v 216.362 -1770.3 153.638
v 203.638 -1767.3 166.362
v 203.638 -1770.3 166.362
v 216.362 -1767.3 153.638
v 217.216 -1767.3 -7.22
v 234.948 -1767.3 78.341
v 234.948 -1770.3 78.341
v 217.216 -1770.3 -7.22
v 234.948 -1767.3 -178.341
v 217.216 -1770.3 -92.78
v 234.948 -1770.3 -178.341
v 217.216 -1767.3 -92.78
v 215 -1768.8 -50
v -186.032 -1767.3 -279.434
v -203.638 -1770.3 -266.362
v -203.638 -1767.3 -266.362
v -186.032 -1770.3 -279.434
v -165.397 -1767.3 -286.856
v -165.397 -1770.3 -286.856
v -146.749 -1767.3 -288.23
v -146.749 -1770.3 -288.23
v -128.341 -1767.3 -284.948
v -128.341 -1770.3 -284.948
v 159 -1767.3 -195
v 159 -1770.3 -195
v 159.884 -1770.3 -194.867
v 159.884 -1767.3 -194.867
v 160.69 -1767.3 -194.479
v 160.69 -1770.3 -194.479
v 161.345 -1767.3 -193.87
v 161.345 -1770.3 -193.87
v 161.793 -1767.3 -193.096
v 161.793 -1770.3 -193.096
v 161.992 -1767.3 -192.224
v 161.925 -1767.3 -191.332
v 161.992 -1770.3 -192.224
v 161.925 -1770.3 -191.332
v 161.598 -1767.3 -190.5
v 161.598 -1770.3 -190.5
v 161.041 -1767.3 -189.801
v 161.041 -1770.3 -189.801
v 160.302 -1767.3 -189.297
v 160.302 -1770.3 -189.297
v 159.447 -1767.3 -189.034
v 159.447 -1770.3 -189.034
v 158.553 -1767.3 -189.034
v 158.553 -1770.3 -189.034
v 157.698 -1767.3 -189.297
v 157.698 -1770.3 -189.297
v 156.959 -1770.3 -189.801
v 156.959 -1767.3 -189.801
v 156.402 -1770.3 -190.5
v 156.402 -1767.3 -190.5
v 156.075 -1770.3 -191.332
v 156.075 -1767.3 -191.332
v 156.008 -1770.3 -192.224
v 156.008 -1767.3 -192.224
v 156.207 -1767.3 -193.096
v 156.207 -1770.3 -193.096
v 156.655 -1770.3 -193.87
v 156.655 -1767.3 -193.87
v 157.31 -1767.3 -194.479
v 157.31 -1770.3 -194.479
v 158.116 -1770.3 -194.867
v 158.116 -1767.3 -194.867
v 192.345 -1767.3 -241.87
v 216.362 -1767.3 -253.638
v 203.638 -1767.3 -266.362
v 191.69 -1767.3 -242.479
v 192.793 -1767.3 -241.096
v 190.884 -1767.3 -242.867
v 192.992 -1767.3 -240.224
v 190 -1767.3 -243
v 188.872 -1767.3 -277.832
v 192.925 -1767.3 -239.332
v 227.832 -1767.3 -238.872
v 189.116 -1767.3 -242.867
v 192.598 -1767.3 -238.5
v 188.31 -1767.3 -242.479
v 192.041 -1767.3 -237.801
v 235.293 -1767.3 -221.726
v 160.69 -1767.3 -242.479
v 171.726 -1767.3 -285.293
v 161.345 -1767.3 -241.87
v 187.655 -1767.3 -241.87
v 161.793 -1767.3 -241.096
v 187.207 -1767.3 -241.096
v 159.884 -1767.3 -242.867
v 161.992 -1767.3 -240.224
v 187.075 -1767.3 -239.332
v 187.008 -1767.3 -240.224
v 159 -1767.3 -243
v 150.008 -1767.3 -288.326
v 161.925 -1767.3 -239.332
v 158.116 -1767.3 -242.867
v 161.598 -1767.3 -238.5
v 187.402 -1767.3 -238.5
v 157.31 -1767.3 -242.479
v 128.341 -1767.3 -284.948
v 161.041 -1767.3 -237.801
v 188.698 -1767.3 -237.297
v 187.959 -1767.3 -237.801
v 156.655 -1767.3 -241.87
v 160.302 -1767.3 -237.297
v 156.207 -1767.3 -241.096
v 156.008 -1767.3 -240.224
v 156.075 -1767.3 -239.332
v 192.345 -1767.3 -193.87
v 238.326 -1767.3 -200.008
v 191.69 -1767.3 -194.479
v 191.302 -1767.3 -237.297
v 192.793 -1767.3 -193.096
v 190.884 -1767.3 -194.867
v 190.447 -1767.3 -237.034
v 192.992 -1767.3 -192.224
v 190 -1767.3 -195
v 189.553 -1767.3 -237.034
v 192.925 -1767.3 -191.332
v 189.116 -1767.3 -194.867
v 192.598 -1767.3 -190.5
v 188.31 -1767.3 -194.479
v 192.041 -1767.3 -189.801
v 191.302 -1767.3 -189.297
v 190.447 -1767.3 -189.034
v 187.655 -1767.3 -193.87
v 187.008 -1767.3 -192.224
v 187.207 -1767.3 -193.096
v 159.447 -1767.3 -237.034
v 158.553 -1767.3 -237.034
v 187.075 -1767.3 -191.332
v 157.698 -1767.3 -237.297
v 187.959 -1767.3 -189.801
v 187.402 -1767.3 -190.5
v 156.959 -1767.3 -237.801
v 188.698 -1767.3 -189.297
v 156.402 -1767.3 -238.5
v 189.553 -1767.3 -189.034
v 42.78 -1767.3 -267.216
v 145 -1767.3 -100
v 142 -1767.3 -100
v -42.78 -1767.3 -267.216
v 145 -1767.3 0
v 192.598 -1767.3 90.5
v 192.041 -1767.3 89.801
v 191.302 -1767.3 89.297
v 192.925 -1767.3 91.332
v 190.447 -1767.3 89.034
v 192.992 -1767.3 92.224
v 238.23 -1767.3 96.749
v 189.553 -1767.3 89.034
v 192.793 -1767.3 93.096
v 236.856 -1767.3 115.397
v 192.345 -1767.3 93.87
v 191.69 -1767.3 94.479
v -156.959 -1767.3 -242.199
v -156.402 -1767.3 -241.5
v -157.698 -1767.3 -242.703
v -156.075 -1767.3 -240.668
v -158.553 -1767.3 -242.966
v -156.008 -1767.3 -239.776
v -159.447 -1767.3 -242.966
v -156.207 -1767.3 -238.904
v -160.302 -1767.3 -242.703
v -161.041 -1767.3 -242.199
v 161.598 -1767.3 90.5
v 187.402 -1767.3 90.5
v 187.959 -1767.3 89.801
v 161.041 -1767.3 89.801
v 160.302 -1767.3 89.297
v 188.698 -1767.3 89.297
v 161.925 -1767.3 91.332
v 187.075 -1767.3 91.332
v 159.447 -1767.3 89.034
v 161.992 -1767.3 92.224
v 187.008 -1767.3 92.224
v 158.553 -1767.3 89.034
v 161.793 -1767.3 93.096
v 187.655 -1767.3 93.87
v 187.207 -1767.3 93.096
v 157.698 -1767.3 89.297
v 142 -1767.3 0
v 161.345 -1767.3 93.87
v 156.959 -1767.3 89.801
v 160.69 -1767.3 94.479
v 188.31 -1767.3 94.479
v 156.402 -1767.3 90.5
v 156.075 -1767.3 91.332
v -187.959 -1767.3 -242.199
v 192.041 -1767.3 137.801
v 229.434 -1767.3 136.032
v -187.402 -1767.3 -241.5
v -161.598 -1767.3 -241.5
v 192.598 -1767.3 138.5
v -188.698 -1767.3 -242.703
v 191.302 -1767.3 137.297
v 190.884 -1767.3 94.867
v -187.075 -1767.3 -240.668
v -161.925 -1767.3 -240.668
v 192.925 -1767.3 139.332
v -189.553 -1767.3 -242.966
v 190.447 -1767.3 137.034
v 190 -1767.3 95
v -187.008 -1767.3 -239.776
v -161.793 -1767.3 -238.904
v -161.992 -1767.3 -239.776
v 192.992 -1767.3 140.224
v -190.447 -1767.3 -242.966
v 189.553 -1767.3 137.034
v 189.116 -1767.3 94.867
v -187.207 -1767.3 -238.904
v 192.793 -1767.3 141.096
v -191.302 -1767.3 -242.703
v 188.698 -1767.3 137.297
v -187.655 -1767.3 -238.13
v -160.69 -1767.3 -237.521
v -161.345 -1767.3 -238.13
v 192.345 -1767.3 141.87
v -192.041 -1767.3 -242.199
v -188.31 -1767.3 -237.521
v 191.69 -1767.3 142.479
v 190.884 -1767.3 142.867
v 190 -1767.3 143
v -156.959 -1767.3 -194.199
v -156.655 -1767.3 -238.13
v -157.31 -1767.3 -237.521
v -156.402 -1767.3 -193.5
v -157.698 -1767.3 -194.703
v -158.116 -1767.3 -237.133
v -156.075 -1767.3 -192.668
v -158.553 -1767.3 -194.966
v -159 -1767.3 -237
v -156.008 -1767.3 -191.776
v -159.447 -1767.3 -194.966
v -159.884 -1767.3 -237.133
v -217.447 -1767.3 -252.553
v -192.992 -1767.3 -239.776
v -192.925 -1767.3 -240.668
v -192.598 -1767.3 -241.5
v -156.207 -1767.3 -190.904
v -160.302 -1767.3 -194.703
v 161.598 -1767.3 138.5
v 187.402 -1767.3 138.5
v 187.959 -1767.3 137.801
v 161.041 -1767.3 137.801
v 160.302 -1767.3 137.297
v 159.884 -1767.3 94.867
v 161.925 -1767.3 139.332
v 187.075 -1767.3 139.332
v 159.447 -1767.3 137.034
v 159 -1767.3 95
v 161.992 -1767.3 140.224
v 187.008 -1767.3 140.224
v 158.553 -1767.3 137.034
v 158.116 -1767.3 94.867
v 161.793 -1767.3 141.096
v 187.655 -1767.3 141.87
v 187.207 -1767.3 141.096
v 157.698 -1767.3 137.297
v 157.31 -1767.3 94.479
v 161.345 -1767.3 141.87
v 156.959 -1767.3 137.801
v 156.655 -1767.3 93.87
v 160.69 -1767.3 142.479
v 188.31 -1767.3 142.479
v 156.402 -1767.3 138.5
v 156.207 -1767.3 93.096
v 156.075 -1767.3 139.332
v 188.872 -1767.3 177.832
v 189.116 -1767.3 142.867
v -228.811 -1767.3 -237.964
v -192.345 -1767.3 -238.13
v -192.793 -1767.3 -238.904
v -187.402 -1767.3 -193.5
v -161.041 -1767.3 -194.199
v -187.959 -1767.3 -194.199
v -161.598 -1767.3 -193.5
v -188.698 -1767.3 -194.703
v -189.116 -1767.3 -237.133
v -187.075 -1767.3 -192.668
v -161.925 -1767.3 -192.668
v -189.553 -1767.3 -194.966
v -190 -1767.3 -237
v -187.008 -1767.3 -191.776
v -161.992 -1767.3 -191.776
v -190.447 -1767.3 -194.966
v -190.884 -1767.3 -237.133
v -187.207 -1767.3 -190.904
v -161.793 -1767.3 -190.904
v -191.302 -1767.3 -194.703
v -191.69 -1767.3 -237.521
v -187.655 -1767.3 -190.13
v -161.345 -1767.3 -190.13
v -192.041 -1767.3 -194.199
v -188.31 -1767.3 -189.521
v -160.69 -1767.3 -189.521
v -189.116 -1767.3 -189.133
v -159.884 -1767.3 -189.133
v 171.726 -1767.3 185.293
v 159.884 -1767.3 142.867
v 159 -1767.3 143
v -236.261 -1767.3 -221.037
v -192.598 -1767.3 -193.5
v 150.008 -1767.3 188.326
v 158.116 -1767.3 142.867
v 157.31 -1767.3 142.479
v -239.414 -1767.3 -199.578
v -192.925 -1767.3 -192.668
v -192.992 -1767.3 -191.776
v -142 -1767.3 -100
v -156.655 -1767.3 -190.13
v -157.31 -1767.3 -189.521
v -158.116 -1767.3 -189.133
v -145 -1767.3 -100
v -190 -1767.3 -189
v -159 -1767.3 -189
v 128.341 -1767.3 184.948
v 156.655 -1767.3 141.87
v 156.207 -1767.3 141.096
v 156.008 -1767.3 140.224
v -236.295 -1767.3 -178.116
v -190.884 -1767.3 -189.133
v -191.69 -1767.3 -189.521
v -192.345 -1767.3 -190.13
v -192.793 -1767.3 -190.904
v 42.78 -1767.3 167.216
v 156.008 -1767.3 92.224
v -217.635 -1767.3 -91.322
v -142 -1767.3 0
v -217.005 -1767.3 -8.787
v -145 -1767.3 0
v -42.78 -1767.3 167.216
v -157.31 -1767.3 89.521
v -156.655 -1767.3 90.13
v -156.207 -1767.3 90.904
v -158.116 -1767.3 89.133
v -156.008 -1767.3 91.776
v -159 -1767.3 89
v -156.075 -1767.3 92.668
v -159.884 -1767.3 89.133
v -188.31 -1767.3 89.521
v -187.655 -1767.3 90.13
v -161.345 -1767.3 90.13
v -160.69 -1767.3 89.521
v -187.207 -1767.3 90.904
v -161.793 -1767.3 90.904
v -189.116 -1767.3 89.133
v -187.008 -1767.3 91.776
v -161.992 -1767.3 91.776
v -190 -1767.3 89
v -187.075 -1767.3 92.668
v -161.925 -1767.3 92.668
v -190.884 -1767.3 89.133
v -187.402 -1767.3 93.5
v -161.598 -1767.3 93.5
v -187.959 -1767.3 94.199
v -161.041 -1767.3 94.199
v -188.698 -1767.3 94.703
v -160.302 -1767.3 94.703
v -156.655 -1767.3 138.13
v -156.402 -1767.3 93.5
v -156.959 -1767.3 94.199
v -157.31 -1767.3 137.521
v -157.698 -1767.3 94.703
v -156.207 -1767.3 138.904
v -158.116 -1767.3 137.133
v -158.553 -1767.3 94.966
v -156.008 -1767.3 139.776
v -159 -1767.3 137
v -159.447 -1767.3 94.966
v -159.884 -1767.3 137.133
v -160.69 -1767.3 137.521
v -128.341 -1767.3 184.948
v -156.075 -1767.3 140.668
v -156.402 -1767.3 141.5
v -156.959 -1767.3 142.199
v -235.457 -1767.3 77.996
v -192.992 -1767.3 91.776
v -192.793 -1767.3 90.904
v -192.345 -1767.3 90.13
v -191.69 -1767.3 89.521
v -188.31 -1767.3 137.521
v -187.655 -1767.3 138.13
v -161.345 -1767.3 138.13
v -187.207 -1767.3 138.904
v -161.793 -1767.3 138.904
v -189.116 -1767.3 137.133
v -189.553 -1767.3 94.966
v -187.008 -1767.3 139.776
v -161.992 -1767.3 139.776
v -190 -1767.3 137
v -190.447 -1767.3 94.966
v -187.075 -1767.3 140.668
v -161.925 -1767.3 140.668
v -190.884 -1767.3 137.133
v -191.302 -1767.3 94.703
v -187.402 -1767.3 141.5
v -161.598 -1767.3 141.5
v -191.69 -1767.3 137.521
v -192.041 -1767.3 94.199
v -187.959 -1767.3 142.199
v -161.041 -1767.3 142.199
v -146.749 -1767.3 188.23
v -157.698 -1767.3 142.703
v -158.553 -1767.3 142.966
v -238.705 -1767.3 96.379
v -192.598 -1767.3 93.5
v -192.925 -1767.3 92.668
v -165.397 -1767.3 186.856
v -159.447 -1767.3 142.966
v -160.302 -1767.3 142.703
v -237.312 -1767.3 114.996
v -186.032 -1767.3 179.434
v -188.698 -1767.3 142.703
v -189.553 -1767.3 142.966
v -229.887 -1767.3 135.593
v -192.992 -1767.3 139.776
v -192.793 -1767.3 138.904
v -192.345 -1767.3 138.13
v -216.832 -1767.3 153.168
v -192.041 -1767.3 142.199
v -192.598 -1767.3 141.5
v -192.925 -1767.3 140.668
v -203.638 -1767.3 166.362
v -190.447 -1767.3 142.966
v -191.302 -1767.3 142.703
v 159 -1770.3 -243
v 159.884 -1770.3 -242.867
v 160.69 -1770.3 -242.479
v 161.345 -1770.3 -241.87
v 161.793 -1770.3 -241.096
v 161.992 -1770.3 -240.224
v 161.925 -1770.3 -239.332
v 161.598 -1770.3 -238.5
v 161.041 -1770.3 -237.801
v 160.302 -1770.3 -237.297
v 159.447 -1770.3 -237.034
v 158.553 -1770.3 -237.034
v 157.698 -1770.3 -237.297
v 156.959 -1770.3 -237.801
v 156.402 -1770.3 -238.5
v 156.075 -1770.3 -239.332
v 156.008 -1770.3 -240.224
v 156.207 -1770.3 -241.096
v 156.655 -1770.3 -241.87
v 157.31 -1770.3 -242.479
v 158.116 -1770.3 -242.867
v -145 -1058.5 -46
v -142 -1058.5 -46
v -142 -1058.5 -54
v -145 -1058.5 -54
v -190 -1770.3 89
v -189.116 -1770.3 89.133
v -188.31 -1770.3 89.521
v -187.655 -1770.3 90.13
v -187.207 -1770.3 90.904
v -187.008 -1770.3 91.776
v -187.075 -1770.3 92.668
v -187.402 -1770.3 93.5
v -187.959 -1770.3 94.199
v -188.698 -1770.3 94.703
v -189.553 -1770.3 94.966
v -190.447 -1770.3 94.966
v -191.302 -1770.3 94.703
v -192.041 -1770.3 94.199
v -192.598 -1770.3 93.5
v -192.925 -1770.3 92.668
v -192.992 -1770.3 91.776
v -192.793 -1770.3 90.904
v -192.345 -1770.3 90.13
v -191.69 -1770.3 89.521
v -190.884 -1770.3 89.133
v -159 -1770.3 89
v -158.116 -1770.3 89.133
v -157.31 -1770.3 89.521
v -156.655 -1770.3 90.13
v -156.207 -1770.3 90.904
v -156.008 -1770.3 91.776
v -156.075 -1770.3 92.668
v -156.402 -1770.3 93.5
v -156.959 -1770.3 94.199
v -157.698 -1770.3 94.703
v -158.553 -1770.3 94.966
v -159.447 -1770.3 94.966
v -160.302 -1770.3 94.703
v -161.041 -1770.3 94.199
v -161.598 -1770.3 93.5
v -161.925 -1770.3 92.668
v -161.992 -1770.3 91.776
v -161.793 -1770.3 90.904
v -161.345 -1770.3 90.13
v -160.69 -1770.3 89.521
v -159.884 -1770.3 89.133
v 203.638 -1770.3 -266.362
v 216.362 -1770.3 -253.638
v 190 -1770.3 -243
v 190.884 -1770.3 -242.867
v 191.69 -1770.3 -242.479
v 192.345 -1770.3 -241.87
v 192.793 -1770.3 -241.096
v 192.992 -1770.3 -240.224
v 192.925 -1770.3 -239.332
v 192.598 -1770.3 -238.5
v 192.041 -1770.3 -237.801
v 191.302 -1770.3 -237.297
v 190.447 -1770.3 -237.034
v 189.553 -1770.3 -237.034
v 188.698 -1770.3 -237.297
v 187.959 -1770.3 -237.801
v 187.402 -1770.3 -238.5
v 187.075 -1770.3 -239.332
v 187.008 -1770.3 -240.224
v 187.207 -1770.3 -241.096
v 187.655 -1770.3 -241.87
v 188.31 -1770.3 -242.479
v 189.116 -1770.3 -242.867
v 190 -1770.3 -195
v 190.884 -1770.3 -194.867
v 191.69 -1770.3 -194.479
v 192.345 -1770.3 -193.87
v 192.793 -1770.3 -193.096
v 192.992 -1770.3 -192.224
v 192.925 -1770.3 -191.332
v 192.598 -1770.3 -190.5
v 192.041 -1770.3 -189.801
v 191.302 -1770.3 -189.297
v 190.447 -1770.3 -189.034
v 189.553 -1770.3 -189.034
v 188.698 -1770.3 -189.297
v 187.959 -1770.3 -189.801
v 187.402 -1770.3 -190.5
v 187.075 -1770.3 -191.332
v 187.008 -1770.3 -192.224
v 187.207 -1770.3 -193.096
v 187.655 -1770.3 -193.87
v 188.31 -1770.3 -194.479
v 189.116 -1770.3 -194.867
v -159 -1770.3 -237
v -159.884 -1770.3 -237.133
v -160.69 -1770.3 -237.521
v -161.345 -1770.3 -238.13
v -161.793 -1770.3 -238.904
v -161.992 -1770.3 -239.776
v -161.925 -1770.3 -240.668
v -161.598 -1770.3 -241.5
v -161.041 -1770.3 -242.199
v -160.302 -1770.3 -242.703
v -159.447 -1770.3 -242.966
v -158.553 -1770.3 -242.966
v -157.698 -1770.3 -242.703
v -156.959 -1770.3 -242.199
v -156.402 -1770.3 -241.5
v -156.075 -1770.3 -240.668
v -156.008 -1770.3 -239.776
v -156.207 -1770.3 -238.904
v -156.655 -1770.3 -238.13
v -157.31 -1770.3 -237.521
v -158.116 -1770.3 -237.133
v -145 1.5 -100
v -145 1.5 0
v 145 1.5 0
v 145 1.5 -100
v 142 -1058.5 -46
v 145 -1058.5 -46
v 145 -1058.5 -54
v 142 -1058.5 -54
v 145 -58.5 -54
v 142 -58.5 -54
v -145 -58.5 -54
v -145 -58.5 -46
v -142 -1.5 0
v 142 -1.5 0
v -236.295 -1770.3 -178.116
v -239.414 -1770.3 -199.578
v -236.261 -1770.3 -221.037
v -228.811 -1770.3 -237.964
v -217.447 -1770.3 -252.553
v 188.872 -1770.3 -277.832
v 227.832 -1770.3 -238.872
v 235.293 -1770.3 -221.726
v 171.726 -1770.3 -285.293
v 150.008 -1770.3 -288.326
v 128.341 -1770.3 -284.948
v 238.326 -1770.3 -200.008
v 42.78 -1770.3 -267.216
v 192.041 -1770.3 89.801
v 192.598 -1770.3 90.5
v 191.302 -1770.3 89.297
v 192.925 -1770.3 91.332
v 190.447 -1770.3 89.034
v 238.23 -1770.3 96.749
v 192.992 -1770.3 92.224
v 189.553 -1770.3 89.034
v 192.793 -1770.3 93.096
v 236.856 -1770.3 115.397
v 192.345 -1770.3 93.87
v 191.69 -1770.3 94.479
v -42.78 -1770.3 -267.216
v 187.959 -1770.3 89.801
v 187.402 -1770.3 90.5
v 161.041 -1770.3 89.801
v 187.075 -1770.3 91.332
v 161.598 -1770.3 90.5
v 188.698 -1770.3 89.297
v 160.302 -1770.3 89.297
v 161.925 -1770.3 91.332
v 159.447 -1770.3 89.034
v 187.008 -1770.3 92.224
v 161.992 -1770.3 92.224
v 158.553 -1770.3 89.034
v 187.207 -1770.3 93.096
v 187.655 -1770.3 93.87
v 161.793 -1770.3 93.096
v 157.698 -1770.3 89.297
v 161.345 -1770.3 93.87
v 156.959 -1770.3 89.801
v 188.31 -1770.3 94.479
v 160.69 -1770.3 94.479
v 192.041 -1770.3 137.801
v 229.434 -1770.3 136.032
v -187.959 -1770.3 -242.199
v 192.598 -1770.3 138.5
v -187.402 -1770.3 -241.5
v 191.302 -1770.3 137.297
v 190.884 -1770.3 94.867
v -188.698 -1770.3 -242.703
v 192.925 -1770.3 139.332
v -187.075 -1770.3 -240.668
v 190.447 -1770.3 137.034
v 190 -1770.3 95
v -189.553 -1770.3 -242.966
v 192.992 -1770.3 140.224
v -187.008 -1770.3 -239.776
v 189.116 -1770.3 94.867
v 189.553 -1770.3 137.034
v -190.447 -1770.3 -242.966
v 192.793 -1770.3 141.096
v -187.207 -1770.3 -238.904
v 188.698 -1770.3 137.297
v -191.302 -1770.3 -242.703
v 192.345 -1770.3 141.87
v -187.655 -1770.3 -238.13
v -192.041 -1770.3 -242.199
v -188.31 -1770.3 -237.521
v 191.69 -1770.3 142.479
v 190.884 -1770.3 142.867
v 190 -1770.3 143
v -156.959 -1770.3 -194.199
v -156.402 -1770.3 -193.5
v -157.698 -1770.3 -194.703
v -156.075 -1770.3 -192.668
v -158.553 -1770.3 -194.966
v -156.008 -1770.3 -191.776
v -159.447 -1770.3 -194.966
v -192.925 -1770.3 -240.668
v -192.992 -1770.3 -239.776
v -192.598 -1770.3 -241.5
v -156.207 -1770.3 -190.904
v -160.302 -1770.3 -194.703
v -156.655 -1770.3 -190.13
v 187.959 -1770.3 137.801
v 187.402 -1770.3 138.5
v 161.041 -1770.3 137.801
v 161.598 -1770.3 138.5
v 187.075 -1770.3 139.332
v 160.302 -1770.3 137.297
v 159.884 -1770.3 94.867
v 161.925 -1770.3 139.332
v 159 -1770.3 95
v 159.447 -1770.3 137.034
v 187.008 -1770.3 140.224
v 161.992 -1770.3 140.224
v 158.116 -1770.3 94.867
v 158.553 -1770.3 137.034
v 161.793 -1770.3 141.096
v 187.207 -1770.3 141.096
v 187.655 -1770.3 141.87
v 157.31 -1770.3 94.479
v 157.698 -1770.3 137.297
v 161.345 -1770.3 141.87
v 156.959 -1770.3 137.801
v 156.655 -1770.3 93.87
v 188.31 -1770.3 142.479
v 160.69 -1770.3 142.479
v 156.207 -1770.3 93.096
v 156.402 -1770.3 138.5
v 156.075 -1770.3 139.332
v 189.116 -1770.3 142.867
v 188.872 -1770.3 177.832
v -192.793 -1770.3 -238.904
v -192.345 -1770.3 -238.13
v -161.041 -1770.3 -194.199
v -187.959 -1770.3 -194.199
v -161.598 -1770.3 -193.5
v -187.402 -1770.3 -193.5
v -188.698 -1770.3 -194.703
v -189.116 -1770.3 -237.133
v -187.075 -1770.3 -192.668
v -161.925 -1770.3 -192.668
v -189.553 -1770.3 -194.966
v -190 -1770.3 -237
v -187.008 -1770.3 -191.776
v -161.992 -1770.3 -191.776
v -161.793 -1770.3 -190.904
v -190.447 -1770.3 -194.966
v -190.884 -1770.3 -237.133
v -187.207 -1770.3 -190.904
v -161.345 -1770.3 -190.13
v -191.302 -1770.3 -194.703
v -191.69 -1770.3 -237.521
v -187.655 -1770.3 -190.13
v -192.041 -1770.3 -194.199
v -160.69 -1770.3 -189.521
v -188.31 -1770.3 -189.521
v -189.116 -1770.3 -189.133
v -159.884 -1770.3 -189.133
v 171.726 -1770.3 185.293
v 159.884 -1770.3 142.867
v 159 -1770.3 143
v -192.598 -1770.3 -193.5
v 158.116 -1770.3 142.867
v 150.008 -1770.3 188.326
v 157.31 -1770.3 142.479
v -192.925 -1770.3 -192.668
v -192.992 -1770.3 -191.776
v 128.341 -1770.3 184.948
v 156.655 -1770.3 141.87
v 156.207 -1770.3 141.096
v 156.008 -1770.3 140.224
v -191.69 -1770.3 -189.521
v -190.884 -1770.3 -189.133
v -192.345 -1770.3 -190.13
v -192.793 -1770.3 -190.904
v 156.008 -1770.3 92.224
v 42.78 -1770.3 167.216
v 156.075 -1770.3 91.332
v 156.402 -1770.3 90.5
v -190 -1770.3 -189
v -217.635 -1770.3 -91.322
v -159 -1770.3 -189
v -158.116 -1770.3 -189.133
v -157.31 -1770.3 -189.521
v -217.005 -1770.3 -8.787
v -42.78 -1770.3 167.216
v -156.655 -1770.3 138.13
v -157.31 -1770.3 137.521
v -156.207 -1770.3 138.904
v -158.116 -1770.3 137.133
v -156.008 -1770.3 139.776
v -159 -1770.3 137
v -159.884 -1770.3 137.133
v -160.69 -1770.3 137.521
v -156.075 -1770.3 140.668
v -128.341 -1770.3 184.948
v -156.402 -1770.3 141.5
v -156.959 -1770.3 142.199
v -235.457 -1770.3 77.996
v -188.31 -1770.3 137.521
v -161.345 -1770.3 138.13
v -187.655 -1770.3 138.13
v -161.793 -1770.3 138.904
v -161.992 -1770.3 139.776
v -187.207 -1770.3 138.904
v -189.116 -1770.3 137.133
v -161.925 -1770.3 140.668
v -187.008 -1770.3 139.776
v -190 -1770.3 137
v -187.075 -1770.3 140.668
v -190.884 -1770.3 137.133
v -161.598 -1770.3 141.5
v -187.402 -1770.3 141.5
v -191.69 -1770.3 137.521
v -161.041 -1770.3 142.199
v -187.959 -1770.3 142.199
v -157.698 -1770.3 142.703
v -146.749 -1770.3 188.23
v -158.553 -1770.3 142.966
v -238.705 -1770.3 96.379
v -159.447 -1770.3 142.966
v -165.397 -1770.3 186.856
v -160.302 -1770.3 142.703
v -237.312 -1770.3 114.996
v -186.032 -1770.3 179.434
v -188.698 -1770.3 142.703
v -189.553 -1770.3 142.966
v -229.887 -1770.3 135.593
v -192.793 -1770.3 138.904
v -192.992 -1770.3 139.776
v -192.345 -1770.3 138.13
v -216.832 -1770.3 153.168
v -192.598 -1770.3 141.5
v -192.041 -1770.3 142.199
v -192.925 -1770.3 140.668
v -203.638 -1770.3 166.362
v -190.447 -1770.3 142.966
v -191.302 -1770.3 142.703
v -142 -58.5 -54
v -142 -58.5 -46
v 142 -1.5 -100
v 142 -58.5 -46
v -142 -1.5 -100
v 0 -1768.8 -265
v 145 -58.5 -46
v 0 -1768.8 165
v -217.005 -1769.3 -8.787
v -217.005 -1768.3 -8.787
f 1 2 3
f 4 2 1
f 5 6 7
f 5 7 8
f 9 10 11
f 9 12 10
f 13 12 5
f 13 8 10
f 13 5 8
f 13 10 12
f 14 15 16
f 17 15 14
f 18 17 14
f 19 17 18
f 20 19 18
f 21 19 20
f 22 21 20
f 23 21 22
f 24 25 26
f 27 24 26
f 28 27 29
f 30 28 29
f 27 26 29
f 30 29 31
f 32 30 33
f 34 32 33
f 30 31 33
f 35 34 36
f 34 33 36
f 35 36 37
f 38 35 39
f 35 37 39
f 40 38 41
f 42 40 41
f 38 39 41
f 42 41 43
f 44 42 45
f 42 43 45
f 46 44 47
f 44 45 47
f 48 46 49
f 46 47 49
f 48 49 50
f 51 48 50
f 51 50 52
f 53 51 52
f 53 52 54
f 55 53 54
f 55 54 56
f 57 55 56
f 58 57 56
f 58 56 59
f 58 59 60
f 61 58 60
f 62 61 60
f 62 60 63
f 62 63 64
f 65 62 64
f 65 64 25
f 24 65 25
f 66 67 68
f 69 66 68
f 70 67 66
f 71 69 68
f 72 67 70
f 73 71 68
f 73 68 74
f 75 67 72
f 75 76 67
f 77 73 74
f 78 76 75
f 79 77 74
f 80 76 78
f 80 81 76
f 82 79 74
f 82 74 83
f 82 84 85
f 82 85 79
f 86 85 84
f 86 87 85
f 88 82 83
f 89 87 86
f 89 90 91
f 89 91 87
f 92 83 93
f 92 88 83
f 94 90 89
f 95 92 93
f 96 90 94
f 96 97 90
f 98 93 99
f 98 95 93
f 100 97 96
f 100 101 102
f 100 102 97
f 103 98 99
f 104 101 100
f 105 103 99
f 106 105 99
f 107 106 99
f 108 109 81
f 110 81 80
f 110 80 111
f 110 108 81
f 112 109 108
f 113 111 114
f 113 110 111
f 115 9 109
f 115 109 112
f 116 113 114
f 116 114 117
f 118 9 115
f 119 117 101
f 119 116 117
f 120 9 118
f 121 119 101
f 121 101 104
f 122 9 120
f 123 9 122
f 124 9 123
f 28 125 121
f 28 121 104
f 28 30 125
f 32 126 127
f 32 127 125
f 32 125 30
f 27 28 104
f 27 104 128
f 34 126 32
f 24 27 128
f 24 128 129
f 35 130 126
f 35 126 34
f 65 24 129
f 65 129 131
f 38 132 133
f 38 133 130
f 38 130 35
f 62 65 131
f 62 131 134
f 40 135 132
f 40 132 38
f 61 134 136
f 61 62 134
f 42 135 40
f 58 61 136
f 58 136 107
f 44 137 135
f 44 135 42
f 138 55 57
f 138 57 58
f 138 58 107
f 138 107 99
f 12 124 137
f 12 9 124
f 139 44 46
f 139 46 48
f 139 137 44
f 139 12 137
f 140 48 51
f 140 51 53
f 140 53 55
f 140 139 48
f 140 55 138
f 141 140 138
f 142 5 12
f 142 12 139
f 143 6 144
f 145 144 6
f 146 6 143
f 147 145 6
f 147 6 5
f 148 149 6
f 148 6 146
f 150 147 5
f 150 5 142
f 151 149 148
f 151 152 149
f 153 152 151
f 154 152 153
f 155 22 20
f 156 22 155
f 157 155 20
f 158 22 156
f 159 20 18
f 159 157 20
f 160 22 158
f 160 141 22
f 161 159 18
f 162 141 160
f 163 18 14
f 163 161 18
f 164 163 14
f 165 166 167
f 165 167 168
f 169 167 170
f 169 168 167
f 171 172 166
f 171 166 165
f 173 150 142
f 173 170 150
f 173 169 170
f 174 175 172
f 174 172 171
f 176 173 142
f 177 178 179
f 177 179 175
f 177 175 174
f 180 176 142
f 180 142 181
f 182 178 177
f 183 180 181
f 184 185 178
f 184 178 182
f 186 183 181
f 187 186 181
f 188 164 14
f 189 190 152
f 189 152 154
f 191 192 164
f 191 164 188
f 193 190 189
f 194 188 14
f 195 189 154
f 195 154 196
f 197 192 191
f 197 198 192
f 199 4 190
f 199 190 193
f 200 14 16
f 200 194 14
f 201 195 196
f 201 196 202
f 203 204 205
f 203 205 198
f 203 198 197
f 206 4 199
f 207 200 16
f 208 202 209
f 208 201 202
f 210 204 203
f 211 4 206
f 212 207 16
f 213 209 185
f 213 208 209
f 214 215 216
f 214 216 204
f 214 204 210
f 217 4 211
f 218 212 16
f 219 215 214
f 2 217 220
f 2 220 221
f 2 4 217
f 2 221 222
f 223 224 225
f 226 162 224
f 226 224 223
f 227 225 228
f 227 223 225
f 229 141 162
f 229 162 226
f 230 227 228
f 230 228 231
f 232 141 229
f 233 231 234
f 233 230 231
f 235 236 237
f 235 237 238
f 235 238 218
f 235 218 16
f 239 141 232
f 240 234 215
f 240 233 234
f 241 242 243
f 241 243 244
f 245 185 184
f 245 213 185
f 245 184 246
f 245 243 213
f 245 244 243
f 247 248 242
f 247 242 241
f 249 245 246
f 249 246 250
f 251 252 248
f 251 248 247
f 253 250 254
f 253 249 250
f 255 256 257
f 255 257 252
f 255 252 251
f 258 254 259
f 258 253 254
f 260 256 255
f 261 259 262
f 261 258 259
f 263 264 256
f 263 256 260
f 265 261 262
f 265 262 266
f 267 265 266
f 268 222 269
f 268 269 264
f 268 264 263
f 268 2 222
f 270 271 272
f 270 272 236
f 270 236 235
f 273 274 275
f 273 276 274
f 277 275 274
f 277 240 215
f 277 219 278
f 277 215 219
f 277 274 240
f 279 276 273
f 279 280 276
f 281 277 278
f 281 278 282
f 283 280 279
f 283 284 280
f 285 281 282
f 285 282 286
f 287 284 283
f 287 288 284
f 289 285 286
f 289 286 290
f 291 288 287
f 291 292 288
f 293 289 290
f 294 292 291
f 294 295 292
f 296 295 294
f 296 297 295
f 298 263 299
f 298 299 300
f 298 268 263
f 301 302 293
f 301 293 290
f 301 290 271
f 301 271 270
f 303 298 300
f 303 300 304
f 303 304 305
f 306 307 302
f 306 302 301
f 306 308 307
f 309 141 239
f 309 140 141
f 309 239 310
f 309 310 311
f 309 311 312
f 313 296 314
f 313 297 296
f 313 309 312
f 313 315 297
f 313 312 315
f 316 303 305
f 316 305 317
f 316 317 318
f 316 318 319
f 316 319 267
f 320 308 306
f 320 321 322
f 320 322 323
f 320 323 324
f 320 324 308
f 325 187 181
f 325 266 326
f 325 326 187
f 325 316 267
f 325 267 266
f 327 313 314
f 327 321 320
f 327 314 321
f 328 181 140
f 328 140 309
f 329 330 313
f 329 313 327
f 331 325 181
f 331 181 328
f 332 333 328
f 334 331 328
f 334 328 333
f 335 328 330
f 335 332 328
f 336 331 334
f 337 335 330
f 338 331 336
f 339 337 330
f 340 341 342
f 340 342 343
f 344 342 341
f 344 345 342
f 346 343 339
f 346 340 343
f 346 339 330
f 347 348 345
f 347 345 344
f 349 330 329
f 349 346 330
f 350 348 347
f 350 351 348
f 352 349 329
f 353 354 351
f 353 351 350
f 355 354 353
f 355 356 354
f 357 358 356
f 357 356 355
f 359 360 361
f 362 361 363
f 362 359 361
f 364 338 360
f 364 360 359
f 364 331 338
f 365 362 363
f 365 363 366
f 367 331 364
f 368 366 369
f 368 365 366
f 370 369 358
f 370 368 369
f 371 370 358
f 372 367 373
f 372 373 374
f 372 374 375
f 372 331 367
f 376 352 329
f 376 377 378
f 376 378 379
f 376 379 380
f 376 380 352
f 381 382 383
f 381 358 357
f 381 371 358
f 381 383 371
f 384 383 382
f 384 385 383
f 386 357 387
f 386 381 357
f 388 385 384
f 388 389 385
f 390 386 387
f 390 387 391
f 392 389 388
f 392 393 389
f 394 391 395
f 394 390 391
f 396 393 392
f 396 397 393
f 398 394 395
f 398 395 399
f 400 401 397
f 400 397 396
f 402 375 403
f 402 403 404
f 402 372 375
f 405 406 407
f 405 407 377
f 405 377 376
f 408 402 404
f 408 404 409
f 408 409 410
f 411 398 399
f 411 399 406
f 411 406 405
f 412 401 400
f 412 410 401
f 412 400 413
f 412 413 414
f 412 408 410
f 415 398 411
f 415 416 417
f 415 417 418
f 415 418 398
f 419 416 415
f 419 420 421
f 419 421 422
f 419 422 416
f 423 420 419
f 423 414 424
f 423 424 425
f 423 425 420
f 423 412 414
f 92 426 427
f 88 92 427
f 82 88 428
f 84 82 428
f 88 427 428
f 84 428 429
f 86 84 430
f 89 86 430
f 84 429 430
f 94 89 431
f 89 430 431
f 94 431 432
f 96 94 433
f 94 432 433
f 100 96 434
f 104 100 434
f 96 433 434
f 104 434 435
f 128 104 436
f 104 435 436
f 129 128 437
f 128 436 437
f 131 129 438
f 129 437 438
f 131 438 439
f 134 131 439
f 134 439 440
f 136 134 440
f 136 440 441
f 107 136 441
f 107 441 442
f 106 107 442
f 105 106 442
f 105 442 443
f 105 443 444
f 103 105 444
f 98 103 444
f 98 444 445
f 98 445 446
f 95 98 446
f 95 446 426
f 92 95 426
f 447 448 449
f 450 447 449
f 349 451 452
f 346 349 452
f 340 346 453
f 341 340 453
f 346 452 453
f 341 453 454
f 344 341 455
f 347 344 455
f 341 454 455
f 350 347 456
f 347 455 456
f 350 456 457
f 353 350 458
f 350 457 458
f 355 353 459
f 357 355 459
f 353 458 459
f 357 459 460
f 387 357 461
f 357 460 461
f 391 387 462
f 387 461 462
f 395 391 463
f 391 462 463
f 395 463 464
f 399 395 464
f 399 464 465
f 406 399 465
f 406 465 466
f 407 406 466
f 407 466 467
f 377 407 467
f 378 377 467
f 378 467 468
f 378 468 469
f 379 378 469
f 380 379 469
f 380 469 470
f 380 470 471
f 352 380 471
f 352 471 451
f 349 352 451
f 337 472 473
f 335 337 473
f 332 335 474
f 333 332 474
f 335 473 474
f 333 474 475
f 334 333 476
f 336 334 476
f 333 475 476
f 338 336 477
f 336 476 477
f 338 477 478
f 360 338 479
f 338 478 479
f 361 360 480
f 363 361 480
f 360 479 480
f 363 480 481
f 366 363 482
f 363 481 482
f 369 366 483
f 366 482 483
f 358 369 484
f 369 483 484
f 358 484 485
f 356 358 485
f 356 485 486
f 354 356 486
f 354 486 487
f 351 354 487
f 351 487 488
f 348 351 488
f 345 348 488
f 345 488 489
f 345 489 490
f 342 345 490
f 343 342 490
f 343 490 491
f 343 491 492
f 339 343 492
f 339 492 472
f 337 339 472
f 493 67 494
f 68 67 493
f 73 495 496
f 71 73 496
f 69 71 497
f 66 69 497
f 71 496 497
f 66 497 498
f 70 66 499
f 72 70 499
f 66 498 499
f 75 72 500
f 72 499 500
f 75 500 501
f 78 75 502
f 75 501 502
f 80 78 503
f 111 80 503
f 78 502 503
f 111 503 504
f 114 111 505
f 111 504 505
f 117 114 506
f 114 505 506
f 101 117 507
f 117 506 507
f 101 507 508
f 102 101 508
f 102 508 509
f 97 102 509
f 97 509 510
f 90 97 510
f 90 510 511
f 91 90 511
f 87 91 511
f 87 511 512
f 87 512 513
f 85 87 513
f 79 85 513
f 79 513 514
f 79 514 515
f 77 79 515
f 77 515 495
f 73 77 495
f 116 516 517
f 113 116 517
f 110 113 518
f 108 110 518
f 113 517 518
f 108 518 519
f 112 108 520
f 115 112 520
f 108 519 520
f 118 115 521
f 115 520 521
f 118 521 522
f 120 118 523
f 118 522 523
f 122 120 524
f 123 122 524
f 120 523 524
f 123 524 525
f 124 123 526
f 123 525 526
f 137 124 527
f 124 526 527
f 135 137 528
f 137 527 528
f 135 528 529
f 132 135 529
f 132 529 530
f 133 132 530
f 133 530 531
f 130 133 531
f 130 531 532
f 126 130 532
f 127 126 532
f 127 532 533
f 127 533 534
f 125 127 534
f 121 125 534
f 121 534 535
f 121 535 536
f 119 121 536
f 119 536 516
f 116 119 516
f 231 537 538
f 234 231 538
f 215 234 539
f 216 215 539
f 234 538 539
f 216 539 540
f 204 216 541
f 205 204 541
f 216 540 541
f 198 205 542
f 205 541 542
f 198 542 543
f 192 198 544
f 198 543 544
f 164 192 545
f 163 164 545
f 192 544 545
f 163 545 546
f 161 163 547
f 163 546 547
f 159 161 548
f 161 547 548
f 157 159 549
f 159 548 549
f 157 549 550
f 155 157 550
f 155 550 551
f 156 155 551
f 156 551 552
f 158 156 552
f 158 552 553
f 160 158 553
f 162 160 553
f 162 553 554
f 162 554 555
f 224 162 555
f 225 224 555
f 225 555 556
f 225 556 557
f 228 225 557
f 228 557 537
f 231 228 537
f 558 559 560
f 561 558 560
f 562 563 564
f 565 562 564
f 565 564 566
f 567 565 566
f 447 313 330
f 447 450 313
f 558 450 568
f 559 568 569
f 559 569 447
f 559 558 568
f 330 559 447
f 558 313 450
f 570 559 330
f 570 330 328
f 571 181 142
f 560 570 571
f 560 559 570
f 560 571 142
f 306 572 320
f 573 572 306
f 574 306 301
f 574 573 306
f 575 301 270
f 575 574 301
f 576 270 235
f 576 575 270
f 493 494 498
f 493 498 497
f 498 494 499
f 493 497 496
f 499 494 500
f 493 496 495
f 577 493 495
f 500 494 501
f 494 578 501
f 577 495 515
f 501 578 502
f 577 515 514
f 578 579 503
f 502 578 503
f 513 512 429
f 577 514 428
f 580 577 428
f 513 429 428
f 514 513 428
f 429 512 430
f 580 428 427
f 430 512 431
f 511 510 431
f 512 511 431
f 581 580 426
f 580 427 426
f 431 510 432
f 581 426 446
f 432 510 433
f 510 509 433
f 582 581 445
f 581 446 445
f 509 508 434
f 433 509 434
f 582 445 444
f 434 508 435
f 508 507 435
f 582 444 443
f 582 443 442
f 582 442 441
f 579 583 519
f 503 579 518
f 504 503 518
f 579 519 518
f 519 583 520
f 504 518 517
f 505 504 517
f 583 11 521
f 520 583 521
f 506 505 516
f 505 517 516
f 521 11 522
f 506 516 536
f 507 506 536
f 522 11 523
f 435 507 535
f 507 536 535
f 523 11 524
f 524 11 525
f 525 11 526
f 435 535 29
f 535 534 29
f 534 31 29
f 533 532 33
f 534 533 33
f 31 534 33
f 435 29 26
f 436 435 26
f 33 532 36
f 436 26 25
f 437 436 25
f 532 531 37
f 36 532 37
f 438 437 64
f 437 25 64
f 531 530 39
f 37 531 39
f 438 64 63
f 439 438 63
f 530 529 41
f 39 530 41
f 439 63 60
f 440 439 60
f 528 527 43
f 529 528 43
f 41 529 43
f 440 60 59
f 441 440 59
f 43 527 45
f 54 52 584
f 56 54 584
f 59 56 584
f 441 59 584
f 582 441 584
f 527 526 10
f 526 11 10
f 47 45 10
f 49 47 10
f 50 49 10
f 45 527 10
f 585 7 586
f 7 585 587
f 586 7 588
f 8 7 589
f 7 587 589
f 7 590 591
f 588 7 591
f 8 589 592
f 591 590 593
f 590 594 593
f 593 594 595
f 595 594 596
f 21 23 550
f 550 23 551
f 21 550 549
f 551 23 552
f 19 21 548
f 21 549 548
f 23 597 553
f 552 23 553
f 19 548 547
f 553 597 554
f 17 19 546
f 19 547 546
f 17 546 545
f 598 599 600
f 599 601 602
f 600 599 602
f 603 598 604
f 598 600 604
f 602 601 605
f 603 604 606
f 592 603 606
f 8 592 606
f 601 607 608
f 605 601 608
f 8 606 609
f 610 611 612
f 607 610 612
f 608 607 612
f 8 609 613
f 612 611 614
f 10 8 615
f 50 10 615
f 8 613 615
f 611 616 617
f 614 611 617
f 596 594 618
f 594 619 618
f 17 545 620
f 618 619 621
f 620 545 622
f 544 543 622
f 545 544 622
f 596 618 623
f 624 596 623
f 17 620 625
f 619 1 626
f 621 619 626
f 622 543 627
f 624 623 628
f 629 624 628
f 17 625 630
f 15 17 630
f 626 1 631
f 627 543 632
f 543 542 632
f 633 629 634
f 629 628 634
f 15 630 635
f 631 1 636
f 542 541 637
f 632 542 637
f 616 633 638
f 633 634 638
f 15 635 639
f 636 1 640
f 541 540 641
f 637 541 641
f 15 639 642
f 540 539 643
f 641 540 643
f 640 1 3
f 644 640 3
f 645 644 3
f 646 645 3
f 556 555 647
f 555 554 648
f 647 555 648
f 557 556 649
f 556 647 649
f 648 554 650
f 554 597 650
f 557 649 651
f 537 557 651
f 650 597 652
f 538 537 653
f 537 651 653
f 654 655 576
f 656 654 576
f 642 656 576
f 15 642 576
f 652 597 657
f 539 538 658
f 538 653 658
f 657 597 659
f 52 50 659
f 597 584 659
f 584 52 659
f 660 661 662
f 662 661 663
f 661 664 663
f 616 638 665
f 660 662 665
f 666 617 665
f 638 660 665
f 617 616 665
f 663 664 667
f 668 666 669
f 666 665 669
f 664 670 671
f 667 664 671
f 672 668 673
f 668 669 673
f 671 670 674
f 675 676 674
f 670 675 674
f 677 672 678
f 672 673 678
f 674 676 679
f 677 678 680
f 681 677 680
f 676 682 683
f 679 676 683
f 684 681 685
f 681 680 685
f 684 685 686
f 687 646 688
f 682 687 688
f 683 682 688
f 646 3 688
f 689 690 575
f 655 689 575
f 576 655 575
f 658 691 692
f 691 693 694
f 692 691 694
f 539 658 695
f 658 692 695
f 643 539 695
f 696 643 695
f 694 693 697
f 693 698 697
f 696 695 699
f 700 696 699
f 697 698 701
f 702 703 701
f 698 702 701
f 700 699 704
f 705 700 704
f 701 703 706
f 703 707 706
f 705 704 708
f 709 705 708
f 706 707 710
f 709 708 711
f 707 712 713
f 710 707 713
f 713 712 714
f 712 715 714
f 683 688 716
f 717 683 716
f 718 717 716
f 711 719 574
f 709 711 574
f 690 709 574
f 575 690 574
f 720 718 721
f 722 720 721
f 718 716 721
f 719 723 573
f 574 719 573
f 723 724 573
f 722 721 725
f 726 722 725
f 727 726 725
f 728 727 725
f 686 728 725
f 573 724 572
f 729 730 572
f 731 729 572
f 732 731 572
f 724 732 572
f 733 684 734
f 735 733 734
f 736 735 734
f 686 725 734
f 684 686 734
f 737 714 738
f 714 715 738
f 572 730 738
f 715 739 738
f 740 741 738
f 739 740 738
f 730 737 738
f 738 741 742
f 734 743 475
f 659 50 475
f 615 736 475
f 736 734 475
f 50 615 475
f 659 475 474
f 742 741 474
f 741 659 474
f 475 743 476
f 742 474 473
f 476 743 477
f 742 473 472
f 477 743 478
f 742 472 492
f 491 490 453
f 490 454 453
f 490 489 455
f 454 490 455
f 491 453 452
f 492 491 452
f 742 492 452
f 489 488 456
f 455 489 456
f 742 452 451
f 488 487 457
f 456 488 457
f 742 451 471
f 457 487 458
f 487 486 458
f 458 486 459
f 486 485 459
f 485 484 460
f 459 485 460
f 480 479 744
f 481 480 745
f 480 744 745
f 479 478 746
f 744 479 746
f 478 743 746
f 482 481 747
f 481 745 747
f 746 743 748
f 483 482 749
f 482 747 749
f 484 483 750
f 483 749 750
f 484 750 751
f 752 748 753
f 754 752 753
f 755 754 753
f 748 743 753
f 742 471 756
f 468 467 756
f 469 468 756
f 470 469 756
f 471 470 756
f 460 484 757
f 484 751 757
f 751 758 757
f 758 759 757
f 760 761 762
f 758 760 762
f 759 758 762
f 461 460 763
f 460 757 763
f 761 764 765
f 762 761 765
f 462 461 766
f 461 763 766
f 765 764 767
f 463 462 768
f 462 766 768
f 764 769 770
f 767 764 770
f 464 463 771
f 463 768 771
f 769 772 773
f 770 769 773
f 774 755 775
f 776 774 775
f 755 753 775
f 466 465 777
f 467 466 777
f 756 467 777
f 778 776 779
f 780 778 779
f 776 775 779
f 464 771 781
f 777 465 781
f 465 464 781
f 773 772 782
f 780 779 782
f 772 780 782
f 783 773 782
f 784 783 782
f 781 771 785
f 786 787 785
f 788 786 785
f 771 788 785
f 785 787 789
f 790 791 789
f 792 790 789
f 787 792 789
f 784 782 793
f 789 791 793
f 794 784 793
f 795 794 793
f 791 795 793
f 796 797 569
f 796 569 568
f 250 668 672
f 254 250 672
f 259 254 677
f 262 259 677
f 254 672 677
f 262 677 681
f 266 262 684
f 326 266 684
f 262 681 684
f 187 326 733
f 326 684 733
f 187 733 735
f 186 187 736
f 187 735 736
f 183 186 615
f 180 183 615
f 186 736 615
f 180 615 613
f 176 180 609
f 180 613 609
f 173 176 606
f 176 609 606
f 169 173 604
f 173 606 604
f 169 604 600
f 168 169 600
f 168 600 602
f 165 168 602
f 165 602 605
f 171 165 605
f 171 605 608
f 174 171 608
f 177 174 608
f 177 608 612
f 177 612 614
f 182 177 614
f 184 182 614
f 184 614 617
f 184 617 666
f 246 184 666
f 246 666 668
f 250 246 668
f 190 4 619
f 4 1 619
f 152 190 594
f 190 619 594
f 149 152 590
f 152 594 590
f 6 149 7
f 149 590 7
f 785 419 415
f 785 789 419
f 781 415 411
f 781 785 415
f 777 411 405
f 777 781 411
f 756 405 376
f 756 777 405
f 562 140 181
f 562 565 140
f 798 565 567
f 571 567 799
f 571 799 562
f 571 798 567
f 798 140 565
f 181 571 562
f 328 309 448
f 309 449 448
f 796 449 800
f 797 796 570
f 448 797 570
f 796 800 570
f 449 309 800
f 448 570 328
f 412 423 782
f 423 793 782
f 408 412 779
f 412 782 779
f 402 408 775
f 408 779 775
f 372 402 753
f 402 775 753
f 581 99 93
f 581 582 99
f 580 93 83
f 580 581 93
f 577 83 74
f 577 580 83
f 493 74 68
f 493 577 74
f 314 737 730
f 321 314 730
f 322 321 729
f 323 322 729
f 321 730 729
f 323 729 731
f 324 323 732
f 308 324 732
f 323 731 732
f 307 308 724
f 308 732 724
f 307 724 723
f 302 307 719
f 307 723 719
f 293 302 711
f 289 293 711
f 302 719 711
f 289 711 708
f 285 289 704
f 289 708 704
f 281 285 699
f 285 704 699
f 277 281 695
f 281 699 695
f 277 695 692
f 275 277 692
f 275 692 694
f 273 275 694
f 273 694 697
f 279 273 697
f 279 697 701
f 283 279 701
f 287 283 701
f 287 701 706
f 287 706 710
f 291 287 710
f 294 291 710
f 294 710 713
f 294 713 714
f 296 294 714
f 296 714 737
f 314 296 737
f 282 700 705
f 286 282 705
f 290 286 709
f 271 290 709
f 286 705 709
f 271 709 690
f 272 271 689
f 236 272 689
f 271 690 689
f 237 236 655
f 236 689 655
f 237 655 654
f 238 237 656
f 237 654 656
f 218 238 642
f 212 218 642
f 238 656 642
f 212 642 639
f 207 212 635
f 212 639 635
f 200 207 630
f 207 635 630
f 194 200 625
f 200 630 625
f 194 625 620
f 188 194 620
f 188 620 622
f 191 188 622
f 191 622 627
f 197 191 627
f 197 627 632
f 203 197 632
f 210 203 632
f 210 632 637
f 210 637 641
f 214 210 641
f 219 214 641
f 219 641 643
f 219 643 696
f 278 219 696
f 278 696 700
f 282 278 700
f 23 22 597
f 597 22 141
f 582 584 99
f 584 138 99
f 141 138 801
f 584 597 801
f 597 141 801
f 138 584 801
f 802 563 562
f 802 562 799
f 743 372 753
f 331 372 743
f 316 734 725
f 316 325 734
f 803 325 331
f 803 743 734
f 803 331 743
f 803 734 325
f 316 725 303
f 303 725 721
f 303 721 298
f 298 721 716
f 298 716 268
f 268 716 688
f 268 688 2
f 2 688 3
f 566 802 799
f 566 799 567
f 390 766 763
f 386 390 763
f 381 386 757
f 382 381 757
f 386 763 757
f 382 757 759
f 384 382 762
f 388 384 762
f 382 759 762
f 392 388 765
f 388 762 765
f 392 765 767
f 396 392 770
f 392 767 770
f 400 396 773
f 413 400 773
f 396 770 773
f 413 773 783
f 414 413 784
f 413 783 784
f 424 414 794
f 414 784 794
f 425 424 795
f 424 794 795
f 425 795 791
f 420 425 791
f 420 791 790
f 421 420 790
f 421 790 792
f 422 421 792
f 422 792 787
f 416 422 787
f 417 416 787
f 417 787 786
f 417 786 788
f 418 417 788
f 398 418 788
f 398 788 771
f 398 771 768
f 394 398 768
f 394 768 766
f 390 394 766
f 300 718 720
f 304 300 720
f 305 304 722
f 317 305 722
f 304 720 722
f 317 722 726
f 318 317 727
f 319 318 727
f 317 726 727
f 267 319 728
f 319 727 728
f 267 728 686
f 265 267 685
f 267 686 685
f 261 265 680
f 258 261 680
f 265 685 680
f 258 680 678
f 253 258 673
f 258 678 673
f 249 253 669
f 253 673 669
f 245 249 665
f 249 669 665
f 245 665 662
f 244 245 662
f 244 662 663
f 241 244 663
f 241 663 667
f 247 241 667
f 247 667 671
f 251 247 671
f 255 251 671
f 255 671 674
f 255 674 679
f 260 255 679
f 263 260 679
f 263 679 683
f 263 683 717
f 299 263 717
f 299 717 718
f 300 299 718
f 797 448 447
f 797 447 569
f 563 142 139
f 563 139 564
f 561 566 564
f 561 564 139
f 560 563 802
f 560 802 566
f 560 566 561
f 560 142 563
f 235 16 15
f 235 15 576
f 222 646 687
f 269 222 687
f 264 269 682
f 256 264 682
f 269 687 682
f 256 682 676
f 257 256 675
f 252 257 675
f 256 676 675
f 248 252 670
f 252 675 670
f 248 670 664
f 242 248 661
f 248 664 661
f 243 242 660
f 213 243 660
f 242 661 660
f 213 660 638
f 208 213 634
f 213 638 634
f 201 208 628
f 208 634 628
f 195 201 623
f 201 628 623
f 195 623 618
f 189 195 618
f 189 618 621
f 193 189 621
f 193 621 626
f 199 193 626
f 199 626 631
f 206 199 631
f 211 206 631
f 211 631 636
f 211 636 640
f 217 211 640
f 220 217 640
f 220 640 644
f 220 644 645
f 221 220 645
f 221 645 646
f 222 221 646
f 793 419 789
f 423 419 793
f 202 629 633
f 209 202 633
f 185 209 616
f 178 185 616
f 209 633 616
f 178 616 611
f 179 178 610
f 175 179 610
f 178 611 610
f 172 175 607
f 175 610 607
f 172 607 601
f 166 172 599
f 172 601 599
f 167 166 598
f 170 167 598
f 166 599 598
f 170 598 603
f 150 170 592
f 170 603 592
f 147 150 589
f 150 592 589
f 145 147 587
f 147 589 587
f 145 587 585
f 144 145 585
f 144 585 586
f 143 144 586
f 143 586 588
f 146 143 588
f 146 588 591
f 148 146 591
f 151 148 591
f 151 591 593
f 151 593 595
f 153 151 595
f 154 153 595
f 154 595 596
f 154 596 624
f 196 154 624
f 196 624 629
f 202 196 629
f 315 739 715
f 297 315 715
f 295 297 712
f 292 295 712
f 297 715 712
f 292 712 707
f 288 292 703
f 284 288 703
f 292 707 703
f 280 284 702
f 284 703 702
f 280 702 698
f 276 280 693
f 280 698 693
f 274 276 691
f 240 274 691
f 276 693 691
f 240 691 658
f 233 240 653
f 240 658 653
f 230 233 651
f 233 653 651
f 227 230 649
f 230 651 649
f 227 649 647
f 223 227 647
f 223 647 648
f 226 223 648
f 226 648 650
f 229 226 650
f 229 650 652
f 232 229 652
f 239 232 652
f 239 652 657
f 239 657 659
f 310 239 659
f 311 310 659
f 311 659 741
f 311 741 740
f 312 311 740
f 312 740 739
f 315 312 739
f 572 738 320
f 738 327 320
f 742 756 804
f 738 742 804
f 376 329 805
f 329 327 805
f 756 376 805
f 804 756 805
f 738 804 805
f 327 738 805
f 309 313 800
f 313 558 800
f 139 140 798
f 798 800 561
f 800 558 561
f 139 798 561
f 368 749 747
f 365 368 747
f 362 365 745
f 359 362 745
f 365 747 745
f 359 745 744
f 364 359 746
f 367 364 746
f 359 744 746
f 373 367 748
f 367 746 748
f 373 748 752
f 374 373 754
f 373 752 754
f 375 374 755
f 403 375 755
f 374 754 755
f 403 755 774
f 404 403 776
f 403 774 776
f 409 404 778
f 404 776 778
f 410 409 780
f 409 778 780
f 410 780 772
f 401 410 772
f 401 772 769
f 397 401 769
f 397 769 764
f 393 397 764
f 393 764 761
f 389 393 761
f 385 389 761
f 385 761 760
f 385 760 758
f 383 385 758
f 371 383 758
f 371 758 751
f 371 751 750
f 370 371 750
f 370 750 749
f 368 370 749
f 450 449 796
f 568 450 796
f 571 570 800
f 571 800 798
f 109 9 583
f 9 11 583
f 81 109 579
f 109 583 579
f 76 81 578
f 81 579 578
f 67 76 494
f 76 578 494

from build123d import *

# Parameters (mm, degrees)
SKETCH1_W           = 290
SKETCH1_H           = 3
BOSS_EXTRUDE1_DEPTH = 100
SKETCH2_W           = 3
SKETCH2_H           = 100
BOSS_EXTRUDE2_DEPTH = 1765.8
SKETCH5_W           = 8
SKETCH5_H           = 1000
CUT_EXTRUDE1_DEPTH  = 150
BOSS_EXTRUDE3_DEPTH = 3
FILLET1_R           = 75
SKETCH7_R           = 3
CUT_EXTRUDE2_DEPTH  = 10


with BuildPart() as part:
    # Sketch1 → Boss-Extrude1 (new body)
    with BuildSketch(Plane.XY):
        Rectangle(SKETCH1_W, SKETCH1_H)
    extrude(amount=-BOSS_EXTRUDE1_DEPTH)

    # Sketch2 → Boss-Extrude2 (add)
    with BuildSketch(Plane.XZ.offset(1.5)):
        with Locations((-143.5, -50)):
            Rectangle(SKETCH2_W, SKETCH2_H)
        with Locations((143.5, -50)):
            Rectangle(SKETCH2_W, SKETCH2_H)
    extrude(amount=BOSS_EXTRUDE2_DEPTH)

    # Sketch5 → Cut-Extrude1 (cut, symmetric)
    with BuildSketch(Plane(origin=(0, 0, 0), x_dir=(0, 0, -1), z_dir=(1, 0, 0))):
        with Locations((50, -558.5)):
            Rectangle(SKETCH5_W, SKETCH5_H)
    extrude(amount=CUT_EXTRUDE1_DEPTH, both=True, mode=Mode.SUBTRACT)

    # Sketch6 → Boss-Extrude3 (add)
    with BuildSketch(Plane.XZ.offset(1767.3)):
        with BuildLine():
            Line((-250, 120), (-170, 200))
            add(Edge.make_bspline(
                [(-170, 200), (0, 130), (170, 200)],
                knots=[0, 0, 0, 1, 1, 1], degree=2))
            Line((170, 200), (250, 120))
            add(Edge.make_bspline(
                [(250, 120), (180, -50), (250, -220)],
                knots=[0, 0, 0, 1, 1, 1], degree=2))
            Line((250, -220), (170, -300))
            add(Edge.make_bspline(
                [(-170, -300), (0, -230), (170, -300)],
                knots=[0, 0, 0, 1, 1, 1], degree=2))
            Line((-170, -300), (-250, -220))
            add(Edge.make_bspline(
                [(-250, 120), (-201.61826543, -7.179894106), (-205.048401237, -92.820105894), (-250, -220)],
                knots=[0, 0, 0, 0, 1, 1, 1, 1], degree=3))
        make_face()
    extrude(amount=BOSS_EXTRUDE3_DEPTH)

    # Fillet1
    fillet1_edges = [part.edges().sort_by_distance(p)[0] for p in [
        (250, -1768.8, 120),
        (-170, -1768.8, 200),
        (-250, -1768.8, 120),
        (-250, -1768.8, -220),
        (-170, -1768.8, -300),
        (170, -1768.8, -300),
        (250, -1768.8, -220),
        (170, -1768.8, 200),
    ]]
    fillet(fillet1_edges, radius=FILLET1_R)

    # Sketch7 → Cut-Extrude2 (cut)
    with BuildSketch(Plane.XZ.offset(1770.3)):
        with Locations(Location((-190, 140, 0), (0, 0, 270))):
            Circle(SKETCH7_R)
        with Locations(Location((-159, 140, 0), (0, 0, 270))):
            Circle(SKETCH7_R)
        with Locations(Location((-190, 92, 0), (0, 0, 270))):
            Circle(SKETCH7_R)
        with Locations(Location((-159, 92, 0), (0, 0, 270))):
            Circle(SKETCH7_R)
        with Locations(Location((190, 92, 0), (0, 0, 90))):
            Circle(SKETCH7_R)
        with Locations(Location((159, 92, 0), (0, 0, 90))):
            Circle(SKETCH7_R)
        with Locations(Location((159, 140, 0), (0, 0, 90))):
            Circle(SKETCH7_R)
        with Locations(Location((190, 140, 0), (0, 0, 90))):
            Circle(SKETCH7_R)
        with Locations(Location((159, -192, 0), (0, 0, 270))):
            Circle(SKETCH7_R)
        with Locations(Location((190, -192, 0), (0, 0, 270))):
            Circle(SKETCH7_R)
        with Locations(Location((190, -240, 0), (0, 0, 270))):
            Circle(SKETCH7_R)
        with Locations(Location((159, -240, 0), (0, 0, 270))):
            Circle(SKETCH7_R)
        with Locations(Location((-190, -192, 0), (0, 0, 90))):
            Circle(SKETCH7_R)
        with Locations(Location((-159, -192, 0), (0, 0, 90))):
            Circle(SKETCH7_R)
        with Locations(Location((-159, -240, 0), (0, 0, 90))):
            Circle(SKETCH7_R)
        with Locations(Location((-190, -240, 0), (0, 0, 90))):
            Circle(SKETCH7_R)
    extrude(amount=-CUT_EXTRUDE2_DEPTH, mode=Mode.SUBTRACT)


solid = part.part
